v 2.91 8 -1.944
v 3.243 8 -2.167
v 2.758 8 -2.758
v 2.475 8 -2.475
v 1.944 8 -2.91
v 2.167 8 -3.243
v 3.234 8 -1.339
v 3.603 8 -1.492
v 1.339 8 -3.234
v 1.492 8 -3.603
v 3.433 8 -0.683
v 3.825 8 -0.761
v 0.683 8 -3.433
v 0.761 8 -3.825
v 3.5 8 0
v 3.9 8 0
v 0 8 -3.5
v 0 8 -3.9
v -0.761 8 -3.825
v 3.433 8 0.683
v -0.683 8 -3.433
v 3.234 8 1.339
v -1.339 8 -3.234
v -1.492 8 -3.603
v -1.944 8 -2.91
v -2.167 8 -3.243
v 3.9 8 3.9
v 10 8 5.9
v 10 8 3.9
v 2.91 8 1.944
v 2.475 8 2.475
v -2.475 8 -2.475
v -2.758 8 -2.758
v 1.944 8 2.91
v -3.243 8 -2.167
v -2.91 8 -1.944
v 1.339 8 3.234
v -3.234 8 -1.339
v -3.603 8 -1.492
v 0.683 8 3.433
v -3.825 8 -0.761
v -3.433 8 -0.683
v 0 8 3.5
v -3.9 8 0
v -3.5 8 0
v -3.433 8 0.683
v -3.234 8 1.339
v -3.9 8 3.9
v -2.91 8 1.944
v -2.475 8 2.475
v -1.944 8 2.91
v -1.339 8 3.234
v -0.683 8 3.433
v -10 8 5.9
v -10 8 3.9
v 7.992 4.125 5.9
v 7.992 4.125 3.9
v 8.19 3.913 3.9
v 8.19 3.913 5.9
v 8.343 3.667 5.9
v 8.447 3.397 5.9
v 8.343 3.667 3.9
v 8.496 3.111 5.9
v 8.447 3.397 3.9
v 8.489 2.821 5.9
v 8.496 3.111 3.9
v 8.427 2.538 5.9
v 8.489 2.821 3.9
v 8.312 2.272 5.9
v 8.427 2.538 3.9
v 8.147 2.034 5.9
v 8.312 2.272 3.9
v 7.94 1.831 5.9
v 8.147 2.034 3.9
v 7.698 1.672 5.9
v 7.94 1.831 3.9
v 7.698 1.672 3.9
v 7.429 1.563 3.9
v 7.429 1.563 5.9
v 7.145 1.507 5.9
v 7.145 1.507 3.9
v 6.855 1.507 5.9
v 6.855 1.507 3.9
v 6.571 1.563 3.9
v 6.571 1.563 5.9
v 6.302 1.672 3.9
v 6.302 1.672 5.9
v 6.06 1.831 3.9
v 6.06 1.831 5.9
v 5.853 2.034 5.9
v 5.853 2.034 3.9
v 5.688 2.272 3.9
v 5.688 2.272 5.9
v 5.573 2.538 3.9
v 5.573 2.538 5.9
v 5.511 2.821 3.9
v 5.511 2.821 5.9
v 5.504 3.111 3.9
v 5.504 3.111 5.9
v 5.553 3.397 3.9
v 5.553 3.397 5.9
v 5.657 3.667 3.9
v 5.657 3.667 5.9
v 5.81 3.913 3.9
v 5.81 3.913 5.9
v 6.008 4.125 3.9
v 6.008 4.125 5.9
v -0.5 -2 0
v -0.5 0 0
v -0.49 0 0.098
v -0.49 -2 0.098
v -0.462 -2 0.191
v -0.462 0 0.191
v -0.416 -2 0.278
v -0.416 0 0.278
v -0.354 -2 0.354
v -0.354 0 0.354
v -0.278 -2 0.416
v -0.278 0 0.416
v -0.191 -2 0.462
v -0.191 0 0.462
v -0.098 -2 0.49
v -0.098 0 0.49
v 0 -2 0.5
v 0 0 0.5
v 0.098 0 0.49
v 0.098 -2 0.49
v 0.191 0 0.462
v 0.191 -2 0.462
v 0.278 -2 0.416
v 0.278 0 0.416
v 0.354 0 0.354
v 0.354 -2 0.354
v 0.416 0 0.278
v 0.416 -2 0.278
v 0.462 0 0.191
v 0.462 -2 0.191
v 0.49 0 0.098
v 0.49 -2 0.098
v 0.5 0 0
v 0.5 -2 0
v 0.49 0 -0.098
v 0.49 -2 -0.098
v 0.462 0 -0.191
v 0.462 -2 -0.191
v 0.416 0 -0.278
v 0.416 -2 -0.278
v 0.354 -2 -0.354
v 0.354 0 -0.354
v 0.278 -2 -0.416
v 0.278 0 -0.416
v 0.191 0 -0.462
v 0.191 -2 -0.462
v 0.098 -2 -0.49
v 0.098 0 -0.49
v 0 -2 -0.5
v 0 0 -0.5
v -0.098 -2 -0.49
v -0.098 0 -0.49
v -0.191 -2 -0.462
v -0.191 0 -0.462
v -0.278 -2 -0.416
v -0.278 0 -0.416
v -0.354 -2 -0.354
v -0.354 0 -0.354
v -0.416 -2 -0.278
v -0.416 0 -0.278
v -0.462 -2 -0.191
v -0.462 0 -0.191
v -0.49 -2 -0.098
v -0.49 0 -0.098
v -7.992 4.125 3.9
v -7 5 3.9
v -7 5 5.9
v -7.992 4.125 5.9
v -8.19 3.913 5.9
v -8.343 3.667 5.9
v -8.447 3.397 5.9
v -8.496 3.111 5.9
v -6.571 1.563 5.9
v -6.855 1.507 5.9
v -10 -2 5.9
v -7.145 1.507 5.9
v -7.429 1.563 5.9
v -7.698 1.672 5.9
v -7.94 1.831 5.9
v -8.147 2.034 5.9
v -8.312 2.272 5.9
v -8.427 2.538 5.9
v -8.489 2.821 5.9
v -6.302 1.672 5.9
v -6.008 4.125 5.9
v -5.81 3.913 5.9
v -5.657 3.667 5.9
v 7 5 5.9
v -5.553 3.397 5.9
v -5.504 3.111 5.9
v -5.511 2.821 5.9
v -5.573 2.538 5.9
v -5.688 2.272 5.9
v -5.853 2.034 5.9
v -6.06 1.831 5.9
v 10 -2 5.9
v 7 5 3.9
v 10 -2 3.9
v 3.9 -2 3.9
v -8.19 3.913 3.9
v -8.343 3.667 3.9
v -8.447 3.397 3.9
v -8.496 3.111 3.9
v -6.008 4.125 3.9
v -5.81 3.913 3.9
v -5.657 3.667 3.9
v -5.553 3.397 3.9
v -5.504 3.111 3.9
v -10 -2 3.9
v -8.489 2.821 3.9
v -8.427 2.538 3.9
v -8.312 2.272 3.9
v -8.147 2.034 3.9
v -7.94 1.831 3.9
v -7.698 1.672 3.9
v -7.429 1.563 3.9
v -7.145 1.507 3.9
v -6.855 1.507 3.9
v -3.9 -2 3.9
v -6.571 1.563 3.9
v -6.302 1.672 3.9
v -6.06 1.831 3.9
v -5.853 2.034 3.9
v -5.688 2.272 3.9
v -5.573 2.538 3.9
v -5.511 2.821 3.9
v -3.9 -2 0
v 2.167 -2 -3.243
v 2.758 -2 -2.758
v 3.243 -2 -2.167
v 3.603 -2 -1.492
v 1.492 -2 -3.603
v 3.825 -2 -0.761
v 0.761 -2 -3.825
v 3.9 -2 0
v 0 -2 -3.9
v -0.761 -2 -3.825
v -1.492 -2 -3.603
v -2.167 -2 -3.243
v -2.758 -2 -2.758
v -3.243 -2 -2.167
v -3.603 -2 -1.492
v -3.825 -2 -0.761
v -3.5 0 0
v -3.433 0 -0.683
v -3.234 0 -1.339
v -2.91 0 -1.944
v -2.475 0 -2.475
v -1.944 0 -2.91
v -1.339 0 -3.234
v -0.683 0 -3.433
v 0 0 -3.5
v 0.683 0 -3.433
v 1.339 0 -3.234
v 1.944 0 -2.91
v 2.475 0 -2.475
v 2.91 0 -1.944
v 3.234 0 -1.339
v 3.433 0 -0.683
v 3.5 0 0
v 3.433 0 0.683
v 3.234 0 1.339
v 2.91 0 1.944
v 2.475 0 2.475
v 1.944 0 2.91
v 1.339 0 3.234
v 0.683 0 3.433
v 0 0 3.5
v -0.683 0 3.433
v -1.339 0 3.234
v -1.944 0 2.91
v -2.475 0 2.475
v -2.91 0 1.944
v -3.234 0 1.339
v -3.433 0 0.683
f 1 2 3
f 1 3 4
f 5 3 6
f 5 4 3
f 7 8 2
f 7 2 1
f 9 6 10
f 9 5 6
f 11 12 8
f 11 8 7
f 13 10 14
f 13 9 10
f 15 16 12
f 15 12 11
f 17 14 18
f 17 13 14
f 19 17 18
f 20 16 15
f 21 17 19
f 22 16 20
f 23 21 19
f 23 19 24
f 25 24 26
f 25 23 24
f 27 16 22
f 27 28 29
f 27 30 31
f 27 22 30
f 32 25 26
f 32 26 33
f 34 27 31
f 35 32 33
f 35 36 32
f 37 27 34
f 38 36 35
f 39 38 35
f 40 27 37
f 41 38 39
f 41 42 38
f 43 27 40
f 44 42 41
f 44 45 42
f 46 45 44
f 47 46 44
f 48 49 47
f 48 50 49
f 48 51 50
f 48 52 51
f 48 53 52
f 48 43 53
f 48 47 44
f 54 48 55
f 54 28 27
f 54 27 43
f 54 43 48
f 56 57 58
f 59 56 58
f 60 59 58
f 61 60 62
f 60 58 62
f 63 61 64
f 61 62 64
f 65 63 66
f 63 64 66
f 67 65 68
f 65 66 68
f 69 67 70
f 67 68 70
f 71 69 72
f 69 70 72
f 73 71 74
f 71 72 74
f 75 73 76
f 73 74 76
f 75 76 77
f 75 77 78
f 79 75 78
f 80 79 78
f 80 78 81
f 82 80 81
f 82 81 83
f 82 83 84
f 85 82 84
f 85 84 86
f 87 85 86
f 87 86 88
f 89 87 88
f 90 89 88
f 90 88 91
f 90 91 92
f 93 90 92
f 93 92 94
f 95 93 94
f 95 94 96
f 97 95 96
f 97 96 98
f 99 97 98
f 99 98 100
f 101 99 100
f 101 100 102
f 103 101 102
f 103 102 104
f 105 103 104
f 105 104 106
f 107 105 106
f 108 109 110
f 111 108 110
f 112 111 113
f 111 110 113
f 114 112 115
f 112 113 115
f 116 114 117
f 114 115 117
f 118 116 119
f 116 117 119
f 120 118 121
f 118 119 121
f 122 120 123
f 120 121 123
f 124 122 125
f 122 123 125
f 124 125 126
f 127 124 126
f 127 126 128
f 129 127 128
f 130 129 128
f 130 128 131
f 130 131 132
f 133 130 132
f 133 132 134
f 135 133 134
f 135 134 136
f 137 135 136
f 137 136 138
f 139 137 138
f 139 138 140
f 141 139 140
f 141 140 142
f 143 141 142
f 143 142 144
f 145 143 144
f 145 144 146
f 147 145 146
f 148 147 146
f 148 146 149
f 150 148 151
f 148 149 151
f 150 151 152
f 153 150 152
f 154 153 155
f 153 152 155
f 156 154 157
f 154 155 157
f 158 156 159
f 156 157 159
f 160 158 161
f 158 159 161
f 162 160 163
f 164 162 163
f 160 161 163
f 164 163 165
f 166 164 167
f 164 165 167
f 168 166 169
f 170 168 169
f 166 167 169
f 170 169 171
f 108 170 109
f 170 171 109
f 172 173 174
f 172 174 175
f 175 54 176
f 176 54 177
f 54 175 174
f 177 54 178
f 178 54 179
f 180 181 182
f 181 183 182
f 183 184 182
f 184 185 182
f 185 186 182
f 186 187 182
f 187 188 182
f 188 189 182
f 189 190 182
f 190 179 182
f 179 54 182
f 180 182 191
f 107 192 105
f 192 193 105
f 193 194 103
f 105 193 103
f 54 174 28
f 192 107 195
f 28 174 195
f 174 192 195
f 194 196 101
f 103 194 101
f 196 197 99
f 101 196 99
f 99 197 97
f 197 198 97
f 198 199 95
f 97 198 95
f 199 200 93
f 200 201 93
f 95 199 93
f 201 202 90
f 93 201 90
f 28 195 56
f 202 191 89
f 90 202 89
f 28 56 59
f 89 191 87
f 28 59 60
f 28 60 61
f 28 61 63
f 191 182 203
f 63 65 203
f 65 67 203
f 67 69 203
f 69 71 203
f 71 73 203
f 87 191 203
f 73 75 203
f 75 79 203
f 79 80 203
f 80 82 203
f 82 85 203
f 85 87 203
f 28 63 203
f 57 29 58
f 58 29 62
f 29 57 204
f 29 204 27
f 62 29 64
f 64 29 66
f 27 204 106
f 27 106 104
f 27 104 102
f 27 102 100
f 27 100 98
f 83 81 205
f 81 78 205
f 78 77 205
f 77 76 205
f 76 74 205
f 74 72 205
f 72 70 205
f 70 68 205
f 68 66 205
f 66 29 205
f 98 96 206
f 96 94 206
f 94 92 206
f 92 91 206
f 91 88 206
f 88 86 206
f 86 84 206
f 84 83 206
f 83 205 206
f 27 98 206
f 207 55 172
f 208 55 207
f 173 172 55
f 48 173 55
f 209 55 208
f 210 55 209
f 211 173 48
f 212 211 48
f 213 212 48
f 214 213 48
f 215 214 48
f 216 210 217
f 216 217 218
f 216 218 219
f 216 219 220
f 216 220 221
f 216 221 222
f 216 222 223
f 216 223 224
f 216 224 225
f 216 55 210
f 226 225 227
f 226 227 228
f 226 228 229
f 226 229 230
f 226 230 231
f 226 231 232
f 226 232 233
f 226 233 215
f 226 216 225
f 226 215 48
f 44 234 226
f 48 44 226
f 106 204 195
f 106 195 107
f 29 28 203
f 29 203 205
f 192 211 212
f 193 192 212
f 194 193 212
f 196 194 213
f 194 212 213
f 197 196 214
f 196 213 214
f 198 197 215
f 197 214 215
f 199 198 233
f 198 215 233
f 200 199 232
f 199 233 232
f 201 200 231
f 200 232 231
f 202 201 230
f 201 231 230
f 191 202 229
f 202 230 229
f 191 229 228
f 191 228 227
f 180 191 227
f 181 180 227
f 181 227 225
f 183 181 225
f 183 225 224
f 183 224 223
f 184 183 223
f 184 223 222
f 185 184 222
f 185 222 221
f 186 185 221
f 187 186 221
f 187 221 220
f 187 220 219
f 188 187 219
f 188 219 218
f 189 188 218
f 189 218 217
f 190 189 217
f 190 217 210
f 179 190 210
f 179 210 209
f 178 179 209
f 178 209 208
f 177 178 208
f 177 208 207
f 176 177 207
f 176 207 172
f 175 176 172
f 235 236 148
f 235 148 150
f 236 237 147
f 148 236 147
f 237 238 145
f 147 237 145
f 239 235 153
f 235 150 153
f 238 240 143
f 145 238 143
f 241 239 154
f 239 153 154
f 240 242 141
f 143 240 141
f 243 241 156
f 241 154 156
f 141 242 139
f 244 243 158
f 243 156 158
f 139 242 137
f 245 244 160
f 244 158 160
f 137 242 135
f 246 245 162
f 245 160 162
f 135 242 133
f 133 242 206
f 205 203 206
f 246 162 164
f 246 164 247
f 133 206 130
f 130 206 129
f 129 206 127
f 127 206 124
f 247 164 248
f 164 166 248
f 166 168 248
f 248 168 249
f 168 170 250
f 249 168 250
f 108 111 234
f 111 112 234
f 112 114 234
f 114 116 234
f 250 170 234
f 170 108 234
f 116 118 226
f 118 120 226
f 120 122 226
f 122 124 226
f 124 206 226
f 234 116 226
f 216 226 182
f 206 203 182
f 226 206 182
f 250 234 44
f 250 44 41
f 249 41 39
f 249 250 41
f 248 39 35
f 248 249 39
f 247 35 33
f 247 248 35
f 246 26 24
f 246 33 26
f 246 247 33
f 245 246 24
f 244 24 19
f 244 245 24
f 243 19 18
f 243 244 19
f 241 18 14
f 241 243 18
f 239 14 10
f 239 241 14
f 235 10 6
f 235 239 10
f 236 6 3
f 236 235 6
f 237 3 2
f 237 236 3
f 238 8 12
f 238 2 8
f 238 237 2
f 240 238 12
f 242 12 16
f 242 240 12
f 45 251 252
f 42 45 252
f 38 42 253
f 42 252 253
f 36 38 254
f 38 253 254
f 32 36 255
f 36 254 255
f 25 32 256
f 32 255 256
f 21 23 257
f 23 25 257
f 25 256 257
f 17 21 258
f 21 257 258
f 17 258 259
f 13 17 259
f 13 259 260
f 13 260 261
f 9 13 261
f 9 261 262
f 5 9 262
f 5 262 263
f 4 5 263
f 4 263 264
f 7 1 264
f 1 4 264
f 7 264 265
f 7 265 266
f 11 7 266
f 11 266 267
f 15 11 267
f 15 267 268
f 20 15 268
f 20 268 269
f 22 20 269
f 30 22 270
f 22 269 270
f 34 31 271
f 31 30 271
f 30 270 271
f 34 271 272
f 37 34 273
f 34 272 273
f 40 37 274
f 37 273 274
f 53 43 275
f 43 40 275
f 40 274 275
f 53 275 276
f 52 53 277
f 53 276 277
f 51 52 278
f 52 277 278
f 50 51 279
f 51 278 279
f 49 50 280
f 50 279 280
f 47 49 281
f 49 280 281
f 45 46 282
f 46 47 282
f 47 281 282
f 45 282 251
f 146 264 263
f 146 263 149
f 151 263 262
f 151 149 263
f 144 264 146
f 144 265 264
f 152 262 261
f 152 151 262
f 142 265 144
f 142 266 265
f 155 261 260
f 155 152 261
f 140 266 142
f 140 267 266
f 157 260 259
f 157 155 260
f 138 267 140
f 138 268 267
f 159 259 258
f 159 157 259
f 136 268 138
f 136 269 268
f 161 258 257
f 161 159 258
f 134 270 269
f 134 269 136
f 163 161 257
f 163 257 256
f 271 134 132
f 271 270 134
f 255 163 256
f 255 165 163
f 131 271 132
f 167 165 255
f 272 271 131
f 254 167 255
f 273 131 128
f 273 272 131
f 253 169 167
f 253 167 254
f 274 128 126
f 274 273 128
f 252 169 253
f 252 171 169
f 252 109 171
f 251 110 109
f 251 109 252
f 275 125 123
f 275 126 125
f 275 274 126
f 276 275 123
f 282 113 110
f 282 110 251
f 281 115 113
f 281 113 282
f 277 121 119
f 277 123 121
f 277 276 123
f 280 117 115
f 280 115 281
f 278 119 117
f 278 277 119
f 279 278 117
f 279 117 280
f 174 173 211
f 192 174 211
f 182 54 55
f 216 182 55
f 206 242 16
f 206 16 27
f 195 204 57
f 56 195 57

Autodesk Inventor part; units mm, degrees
ref_plane "YZ Plane" through (0, 0, 0) normal (1, 0, 0) x (0, 1, 0)
ref_plane "XZ Plane" through (0, 0, 0) normal (0, 1, 0) x (-1, 0, 0)
ref_plane "XY Plane" through (0, 0, 0) normal (0, 0, 1) x (1, 0, 0)
sketch "Sketch1" plane through (0, 0, 0) normal (0, 1, 0) x (-1, 0, 0)
  circle A0 centre (0, 0) radius 3.5
  circle A1 centre (0, 0) radius 3.9
  circle A2 centre (0, 0) radius 0.5
  line L0 (3.9, 0) -> (3.9, 3.9)
  line L1 (3.9, 3.9) -> (0, 3.9)
  line L2 (-3.9, 0) -> (-3.9, 3.9)
  line L3 (-3.9, 3.9) -> (0, 3.9)
  line L4 (3.9, 3.9) -> (3.9, 5.9)
  line L5 (3.9, 5.9) -> (-3.9, 5.9)
  line L6 (-3.9, 5.9) -> (-3.9, 3.9)
  line L7 (3.9, 5.9) -> (10, 5.9)
  line L8 (10, 5.9) -> (10, 3.9)
  line L9 (10, 3.9) -> (3.9, 3.9)
  line L10 (-3.9, 5.9) -> (-10, 5.9)
  line L11 (-10, 5.9) -> (-10, 3.9)
  line L12 (-10, 3.9) -> (-3.9, 3.9)
  dimension "d0" = 7
  dimension "d1" = 7.8
  dimension "d2" = 1
  dimension "d7" = 2
  dimension "d10" = 20
extrude "Extrusion1" add sketch "Sketch1" along normal blind 8 contours A1 | A1 L1 L0 | L3 L6 L5 L4 L1 | A1 L2 L3 | L4 L7 L8 L9 | L12 L11 L10 L6
extrude "Extrusion2" add sketch "Sketch1" against normal blind 2 contours A0 | A1 | A1 L1 L0 | L3 L6 L5 L4 L1 | A1 L2 L3 | L4 L7 L8 L9 | L12 L11 L10 L6
sketch "Sketch2" plane through (10, 8, 3.9) normal (0, 0, -1) x (-1, 0, 0)
  circle A0 centre (3, -5) radius 1.5
  circle A1 centre (17, -5) radius 1.5
  line L0 (3, -5) -> (17, -5) construction
  line L1 (0, -10) -> (0, 0) construction
  line L2 (20, -10) -> (20, 0) construction
  line L3 (0, 0) -> (6.1, 0) projected
  line L4 (3, -3.5) -> (3, -3) construction
  line L5 (3, -3) -> (3.9922, -3.875)
  line L6 (3, -3) -> (2.0078, -3.875)
  line L7 (17, -3.5) -> (17, -3) construction
  line L8 (17, -3) -> (16.0078, -3.875)
  line L9 (17, -3) -> (17.9922, -3.875)
  point P0 (10, -8)
  dimension "d11" = 3
  dimension "d12" = 3
  dimension "d13" = 3
  dimension "d14" = 3
  dimension "d15" = 5
  dimension "d18" = 0.5
  dimension "d19" = 0.5
extrude "Extrusion3" cut sketch "Sketch2" against normal through all
equation "\"d13\" = d12"
equation "\"d14\" = d11"
equation "\"d19\" = d18"
properties part number "w_3DPrint"
